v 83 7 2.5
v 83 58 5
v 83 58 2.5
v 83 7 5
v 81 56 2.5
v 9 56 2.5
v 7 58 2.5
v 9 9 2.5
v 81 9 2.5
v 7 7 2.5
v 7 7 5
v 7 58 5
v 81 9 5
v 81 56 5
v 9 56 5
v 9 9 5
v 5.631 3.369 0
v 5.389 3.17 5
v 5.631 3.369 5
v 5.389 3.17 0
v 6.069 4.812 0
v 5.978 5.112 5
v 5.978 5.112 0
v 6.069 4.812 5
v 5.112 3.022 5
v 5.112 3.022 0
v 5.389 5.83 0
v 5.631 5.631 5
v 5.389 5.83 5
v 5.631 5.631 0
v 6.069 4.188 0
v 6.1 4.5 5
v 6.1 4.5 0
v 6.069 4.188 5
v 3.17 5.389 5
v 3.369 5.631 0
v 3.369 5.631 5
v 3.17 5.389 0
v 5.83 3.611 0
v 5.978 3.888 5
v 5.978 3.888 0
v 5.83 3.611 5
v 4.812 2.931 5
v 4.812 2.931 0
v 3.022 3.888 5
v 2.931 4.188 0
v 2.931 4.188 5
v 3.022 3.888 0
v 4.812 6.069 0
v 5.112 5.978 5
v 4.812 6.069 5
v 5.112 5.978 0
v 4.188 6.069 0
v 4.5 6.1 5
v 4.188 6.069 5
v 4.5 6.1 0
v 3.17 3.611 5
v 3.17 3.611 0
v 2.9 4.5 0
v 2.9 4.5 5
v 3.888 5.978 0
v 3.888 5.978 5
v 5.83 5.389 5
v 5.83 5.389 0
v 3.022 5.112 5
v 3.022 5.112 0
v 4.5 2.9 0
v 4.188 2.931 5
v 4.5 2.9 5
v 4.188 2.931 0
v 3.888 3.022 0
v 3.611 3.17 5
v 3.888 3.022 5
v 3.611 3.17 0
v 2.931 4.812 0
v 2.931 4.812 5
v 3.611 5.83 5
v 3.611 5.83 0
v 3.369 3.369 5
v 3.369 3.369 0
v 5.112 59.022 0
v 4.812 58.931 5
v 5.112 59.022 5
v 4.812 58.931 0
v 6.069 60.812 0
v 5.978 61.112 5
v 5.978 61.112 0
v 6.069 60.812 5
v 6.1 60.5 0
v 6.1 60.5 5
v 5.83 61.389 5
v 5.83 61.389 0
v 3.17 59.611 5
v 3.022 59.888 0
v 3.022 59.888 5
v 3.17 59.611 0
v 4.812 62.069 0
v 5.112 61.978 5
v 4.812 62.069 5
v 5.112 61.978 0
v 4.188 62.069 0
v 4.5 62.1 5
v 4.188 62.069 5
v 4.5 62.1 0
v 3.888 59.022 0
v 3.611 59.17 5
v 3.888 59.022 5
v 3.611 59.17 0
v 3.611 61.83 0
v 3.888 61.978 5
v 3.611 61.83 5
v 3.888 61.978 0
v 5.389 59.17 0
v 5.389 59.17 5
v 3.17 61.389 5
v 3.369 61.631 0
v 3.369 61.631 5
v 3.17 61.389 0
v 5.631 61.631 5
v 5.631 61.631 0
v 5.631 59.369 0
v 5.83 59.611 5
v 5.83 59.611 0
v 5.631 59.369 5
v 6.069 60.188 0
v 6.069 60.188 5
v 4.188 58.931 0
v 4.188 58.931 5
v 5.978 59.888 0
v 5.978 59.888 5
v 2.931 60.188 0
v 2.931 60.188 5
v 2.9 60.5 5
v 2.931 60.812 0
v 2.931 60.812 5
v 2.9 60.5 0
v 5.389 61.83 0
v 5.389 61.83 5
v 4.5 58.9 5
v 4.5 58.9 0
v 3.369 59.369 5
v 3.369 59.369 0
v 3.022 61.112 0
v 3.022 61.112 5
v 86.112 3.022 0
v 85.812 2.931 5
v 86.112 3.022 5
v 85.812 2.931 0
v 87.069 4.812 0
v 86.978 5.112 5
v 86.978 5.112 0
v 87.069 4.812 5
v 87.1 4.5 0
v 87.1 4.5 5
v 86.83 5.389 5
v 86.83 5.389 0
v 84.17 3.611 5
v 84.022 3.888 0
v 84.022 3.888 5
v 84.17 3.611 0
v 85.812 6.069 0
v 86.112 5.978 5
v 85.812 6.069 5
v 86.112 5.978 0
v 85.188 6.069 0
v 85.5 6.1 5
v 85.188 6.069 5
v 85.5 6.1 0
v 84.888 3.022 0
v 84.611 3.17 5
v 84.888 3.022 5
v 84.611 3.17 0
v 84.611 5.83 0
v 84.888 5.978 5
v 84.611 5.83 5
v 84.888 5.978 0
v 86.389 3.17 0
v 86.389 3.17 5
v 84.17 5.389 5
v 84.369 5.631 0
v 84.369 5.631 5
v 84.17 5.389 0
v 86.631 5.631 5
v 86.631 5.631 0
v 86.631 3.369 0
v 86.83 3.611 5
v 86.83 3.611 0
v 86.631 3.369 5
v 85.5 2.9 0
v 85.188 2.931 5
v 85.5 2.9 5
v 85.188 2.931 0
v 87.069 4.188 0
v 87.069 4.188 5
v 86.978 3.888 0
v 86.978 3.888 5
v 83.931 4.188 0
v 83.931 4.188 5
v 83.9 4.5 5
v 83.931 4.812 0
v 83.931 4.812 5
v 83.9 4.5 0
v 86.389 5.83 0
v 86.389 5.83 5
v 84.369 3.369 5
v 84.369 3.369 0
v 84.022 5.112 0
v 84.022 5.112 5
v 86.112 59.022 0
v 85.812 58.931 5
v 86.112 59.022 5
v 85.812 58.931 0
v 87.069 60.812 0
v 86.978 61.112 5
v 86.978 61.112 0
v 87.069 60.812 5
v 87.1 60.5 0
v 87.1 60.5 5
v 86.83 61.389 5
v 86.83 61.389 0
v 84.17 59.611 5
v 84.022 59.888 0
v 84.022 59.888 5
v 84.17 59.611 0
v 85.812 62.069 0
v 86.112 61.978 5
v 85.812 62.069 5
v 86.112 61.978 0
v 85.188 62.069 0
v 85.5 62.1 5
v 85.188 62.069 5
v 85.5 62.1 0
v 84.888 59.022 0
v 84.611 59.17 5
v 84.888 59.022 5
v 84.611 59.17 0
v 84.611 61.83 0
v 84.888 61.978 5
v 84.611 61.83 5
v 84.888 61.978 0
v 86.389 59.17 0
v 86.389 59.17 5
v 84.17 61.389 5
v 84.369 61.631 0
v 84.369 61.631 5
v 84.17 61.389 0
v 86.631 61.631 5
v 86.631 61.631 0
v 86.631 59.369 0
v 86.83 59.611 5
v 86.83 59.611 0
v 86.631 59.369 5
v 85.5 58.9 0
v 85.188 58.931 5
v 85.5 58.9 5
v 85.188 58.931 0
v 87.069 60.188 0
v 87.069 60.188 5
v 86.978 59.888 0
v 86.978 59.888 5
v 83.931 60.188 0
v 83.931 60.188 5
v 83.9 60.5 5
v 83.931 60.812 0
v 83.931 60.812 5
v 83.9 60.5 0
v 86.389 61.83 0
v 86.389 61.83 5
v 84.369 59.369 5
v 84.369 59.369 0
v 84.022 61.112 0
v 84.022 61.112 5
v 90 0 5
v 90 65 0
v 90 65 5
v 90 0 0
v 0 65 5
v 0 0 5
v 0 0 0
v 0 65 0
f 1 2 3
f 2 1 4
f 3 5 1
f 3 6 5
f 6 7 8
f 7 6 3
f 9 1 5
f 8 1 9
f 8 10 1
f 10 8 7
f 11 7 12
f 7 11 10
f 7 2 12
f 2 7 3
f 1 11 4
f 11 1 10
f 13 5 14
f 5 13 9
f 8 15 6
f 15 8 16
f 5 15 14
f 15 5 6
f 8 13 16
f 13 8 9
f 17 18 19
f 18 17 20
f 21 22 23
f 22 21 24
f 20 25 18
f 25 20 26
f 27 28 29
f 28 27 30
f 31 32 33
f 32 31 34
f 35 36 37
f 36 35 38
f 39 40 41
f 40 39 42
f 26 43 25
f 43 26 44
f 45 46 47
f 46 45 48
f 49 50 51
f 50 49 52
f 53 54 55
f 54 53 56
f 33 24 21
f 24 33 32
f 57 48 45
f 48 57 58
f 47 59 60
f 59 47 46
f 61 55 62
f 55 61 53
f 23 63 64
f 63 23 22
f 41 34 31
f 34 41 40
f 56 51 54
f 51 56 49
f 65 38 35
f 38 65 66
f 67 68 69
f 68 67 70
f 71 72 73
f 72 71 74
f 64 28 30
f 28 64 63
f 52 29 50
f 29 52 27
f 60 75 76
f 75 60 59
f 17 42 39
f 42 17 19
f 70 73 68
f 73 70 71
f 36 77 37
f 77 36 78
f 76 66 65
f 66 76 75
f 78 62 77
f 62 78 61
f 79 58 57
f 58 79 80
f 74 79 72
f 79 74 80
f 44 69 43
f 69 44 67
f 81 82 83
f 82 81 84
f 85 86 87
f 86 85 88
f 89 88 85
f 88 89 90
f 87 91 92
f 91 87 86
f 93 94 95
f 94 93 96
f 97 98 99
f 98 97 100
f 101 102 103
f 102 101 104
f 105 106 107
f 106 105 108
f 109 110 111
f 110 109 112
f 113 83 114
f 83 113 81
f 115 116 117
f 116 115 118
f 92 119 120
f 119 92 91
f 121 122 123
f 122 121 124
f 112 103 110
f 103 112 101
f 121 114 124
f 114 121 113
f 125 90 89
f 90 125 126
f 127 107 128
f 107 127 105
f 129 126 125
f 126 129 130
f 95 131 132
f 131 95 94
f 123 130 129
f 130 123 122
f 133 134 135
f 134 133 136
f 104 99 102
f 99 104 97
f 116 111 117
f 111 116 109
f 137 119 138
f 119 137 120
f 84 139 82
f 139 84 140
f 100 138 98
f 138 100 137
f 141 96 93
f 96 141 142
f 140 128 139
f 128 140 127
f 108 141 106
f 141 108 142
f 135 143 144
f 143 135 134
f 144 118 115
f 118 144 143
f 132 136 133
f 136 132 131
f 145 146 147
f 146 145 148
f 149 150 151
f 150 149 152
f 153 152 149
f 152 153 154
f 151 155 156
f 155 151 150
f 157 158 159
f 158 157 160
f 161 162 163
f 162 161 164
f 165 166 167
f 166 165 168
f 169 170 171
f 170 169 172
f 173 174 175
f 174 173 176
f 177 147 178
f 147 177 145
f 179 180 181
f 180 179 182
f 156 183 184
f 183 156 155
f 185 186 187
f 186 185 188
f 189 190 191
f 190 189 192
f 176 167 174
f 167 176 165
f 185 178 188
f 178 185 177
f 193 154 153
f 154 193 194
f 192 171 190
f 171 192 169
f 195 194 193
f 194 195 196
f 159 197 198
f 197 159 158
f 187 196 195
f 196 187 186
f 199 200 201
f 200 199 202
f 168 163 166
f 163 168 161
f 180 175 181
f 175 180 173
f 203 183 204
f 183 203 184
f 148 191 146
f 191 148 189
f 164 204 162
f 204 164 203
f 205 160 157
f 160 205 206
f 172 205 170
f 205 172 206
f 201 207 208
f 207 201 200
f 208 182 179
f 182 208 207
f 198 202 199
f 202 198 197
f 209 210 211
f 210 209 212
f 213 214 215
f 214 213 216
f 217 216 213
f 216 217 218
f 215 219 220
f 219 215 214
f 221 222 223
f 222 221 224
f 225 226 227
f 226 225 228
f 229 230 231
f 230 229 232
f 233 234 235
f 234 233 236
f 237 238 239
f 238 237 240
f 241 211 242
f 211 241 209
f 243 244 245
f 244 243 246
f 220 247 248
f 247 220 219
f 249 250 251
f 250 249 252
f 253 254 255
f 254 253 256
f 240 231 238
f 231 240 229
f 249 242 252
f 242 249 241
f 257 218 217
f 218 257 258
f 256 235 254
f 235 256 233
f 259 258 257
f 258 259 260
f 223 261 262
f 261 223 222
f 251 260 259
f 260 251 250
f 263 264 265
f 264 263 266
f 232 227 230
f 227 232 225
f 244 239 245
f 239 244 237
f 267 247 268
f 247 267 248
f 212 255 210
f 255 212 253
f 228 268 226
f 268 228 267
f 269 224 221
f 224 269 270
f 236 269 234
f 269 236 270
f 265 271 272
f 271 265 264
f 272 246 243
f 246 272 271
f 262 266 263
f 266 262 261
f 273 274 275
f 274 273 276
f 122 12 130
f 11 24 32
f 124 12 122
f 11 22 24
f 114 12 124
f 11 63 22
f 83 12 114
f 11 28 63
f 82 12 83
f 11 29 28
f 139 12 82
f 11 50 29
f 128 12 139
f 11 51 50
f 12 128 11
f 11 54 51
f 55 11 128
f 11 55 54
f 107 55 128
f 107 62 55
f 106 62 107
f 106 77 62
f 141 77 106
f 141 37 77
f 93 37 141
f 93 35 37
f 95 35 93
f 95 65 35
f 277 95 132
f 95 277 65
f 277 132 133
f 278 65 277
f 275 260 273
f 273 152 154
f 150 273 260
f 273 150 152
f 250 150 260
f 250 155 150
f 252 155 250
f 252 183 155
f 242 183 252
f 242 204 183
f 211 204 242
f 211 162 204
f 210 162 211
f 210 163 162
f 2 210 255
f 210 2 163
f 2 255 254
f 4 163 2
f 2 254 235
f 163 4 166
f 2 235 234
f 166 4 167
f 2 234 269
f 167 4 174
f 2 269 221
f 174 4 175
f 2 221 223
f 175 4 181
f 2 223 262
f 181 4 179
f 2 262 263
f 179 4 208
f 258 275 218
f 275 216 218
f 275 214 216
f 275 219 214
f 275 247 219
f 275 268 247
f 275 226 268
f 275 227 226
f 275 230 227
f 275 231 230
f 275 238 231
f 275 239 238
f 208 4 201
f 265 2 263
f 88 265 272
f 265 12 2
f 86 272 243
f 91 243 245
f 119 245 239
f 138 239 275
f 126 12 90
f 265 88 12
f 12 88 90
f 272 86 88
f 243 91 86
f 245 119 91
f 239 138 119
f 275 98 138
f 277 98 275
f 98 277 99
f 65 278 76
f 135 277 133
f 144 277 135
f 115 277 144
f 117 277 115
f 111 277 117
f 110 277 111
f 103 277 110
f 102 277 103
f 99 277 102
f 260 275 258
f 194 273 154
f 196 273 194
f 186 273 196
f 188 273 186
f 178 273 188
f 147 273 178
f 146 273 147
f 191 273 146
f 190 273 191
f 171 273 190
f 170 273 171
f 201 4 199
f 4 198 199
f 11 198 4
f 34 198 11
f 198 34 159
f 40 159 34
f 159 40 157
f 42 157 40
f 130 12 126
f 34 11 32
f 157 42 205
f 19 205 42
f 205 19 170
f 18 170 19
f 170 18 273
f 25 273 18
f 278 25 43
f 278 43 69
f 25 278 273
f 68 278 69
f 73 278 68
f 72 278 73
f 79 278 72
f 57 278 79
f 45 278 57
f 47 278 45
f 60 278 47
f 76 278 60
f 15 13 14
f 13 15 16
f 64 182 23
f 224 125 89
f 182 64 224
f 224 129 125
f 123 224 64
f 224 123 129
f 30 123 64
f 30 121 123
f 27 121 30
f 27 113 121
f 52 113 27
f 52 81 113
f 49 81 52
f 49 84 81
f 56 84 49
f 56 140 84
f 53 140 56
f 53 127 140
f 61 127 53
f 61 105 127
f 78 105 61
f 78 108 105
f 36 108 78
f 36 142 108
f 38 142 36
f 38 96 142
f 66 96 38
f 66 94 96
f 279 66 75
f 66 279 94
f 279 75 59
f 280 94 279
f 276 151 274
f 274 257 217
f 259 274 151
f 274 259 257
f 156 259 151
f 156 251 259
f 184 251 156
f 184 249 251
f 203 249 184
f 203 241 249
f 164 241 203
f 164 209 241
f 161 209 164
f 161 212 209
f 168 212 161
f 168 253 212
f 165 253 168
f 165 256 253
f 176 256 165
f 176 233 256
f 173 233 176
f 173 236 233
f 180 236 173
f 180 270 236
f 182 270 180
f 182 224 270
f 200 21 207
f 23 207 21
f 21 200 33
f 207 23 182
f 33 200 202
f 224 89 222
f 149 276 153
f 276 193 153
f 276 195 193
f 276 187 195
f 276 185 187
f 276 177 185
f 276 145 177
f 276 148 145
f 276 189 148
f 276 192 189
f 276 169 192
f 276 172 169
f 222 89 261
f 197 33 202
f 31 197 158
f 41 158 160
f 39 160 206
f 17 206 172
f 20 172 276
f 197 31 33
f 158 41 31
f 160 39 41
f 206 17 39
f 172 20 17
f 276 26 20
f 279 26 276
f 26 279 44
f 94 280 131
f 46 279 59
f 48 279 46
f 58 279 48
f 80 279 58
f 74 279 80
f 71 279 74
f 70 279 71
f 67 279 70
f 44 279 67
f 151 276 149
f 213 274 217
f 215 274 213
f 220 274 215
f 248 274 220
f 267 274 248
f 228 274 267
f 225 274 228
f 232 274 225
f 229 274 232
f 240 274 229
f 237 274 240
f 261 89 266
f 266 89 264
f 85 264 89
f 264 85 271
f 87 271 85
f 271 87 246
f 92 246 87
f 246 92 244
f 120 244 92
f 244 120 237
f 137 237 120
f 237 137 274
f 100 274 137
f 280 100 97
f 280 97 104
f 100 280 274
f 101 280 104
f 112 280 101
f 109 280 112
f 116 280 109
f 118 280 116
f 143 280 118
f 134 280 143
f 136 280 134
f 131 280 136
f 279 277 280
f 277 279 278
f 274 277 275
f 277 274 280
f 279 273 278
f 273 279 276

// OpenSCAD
$fn = 32;
// Enclosure lid with a closed gasket groove.

width = 90;
depth = 65;
thickness = 5;
groove_w = 2;
groove_d = 2.5;
margin = 7;
hole_d = 3.2;

difference() {
    cube([width, depth, thickness]);
    difference() {
        translate([margin, margin, thickness - groove_d])
            cube([width - 2 * margin, depth - 2 * margin, groove_d + 1]);
        translate([margin + groove_w, margin + groove_w, thickness - groove_d - 1])
            cube([
                width - 2 * (margin + groove_w),
                depth - 2 * (margin + groove_w),
                groove_d + 3
            ]);
    }
    for (x = [margin / 2 + 1, width - margin / 2 - 1],
         y = [margin / 2 + 1, depth - margin / 2 - 1])
        translate([x, y, -1]) cylinder(h = thickness + 2, d = hole_d);
}
